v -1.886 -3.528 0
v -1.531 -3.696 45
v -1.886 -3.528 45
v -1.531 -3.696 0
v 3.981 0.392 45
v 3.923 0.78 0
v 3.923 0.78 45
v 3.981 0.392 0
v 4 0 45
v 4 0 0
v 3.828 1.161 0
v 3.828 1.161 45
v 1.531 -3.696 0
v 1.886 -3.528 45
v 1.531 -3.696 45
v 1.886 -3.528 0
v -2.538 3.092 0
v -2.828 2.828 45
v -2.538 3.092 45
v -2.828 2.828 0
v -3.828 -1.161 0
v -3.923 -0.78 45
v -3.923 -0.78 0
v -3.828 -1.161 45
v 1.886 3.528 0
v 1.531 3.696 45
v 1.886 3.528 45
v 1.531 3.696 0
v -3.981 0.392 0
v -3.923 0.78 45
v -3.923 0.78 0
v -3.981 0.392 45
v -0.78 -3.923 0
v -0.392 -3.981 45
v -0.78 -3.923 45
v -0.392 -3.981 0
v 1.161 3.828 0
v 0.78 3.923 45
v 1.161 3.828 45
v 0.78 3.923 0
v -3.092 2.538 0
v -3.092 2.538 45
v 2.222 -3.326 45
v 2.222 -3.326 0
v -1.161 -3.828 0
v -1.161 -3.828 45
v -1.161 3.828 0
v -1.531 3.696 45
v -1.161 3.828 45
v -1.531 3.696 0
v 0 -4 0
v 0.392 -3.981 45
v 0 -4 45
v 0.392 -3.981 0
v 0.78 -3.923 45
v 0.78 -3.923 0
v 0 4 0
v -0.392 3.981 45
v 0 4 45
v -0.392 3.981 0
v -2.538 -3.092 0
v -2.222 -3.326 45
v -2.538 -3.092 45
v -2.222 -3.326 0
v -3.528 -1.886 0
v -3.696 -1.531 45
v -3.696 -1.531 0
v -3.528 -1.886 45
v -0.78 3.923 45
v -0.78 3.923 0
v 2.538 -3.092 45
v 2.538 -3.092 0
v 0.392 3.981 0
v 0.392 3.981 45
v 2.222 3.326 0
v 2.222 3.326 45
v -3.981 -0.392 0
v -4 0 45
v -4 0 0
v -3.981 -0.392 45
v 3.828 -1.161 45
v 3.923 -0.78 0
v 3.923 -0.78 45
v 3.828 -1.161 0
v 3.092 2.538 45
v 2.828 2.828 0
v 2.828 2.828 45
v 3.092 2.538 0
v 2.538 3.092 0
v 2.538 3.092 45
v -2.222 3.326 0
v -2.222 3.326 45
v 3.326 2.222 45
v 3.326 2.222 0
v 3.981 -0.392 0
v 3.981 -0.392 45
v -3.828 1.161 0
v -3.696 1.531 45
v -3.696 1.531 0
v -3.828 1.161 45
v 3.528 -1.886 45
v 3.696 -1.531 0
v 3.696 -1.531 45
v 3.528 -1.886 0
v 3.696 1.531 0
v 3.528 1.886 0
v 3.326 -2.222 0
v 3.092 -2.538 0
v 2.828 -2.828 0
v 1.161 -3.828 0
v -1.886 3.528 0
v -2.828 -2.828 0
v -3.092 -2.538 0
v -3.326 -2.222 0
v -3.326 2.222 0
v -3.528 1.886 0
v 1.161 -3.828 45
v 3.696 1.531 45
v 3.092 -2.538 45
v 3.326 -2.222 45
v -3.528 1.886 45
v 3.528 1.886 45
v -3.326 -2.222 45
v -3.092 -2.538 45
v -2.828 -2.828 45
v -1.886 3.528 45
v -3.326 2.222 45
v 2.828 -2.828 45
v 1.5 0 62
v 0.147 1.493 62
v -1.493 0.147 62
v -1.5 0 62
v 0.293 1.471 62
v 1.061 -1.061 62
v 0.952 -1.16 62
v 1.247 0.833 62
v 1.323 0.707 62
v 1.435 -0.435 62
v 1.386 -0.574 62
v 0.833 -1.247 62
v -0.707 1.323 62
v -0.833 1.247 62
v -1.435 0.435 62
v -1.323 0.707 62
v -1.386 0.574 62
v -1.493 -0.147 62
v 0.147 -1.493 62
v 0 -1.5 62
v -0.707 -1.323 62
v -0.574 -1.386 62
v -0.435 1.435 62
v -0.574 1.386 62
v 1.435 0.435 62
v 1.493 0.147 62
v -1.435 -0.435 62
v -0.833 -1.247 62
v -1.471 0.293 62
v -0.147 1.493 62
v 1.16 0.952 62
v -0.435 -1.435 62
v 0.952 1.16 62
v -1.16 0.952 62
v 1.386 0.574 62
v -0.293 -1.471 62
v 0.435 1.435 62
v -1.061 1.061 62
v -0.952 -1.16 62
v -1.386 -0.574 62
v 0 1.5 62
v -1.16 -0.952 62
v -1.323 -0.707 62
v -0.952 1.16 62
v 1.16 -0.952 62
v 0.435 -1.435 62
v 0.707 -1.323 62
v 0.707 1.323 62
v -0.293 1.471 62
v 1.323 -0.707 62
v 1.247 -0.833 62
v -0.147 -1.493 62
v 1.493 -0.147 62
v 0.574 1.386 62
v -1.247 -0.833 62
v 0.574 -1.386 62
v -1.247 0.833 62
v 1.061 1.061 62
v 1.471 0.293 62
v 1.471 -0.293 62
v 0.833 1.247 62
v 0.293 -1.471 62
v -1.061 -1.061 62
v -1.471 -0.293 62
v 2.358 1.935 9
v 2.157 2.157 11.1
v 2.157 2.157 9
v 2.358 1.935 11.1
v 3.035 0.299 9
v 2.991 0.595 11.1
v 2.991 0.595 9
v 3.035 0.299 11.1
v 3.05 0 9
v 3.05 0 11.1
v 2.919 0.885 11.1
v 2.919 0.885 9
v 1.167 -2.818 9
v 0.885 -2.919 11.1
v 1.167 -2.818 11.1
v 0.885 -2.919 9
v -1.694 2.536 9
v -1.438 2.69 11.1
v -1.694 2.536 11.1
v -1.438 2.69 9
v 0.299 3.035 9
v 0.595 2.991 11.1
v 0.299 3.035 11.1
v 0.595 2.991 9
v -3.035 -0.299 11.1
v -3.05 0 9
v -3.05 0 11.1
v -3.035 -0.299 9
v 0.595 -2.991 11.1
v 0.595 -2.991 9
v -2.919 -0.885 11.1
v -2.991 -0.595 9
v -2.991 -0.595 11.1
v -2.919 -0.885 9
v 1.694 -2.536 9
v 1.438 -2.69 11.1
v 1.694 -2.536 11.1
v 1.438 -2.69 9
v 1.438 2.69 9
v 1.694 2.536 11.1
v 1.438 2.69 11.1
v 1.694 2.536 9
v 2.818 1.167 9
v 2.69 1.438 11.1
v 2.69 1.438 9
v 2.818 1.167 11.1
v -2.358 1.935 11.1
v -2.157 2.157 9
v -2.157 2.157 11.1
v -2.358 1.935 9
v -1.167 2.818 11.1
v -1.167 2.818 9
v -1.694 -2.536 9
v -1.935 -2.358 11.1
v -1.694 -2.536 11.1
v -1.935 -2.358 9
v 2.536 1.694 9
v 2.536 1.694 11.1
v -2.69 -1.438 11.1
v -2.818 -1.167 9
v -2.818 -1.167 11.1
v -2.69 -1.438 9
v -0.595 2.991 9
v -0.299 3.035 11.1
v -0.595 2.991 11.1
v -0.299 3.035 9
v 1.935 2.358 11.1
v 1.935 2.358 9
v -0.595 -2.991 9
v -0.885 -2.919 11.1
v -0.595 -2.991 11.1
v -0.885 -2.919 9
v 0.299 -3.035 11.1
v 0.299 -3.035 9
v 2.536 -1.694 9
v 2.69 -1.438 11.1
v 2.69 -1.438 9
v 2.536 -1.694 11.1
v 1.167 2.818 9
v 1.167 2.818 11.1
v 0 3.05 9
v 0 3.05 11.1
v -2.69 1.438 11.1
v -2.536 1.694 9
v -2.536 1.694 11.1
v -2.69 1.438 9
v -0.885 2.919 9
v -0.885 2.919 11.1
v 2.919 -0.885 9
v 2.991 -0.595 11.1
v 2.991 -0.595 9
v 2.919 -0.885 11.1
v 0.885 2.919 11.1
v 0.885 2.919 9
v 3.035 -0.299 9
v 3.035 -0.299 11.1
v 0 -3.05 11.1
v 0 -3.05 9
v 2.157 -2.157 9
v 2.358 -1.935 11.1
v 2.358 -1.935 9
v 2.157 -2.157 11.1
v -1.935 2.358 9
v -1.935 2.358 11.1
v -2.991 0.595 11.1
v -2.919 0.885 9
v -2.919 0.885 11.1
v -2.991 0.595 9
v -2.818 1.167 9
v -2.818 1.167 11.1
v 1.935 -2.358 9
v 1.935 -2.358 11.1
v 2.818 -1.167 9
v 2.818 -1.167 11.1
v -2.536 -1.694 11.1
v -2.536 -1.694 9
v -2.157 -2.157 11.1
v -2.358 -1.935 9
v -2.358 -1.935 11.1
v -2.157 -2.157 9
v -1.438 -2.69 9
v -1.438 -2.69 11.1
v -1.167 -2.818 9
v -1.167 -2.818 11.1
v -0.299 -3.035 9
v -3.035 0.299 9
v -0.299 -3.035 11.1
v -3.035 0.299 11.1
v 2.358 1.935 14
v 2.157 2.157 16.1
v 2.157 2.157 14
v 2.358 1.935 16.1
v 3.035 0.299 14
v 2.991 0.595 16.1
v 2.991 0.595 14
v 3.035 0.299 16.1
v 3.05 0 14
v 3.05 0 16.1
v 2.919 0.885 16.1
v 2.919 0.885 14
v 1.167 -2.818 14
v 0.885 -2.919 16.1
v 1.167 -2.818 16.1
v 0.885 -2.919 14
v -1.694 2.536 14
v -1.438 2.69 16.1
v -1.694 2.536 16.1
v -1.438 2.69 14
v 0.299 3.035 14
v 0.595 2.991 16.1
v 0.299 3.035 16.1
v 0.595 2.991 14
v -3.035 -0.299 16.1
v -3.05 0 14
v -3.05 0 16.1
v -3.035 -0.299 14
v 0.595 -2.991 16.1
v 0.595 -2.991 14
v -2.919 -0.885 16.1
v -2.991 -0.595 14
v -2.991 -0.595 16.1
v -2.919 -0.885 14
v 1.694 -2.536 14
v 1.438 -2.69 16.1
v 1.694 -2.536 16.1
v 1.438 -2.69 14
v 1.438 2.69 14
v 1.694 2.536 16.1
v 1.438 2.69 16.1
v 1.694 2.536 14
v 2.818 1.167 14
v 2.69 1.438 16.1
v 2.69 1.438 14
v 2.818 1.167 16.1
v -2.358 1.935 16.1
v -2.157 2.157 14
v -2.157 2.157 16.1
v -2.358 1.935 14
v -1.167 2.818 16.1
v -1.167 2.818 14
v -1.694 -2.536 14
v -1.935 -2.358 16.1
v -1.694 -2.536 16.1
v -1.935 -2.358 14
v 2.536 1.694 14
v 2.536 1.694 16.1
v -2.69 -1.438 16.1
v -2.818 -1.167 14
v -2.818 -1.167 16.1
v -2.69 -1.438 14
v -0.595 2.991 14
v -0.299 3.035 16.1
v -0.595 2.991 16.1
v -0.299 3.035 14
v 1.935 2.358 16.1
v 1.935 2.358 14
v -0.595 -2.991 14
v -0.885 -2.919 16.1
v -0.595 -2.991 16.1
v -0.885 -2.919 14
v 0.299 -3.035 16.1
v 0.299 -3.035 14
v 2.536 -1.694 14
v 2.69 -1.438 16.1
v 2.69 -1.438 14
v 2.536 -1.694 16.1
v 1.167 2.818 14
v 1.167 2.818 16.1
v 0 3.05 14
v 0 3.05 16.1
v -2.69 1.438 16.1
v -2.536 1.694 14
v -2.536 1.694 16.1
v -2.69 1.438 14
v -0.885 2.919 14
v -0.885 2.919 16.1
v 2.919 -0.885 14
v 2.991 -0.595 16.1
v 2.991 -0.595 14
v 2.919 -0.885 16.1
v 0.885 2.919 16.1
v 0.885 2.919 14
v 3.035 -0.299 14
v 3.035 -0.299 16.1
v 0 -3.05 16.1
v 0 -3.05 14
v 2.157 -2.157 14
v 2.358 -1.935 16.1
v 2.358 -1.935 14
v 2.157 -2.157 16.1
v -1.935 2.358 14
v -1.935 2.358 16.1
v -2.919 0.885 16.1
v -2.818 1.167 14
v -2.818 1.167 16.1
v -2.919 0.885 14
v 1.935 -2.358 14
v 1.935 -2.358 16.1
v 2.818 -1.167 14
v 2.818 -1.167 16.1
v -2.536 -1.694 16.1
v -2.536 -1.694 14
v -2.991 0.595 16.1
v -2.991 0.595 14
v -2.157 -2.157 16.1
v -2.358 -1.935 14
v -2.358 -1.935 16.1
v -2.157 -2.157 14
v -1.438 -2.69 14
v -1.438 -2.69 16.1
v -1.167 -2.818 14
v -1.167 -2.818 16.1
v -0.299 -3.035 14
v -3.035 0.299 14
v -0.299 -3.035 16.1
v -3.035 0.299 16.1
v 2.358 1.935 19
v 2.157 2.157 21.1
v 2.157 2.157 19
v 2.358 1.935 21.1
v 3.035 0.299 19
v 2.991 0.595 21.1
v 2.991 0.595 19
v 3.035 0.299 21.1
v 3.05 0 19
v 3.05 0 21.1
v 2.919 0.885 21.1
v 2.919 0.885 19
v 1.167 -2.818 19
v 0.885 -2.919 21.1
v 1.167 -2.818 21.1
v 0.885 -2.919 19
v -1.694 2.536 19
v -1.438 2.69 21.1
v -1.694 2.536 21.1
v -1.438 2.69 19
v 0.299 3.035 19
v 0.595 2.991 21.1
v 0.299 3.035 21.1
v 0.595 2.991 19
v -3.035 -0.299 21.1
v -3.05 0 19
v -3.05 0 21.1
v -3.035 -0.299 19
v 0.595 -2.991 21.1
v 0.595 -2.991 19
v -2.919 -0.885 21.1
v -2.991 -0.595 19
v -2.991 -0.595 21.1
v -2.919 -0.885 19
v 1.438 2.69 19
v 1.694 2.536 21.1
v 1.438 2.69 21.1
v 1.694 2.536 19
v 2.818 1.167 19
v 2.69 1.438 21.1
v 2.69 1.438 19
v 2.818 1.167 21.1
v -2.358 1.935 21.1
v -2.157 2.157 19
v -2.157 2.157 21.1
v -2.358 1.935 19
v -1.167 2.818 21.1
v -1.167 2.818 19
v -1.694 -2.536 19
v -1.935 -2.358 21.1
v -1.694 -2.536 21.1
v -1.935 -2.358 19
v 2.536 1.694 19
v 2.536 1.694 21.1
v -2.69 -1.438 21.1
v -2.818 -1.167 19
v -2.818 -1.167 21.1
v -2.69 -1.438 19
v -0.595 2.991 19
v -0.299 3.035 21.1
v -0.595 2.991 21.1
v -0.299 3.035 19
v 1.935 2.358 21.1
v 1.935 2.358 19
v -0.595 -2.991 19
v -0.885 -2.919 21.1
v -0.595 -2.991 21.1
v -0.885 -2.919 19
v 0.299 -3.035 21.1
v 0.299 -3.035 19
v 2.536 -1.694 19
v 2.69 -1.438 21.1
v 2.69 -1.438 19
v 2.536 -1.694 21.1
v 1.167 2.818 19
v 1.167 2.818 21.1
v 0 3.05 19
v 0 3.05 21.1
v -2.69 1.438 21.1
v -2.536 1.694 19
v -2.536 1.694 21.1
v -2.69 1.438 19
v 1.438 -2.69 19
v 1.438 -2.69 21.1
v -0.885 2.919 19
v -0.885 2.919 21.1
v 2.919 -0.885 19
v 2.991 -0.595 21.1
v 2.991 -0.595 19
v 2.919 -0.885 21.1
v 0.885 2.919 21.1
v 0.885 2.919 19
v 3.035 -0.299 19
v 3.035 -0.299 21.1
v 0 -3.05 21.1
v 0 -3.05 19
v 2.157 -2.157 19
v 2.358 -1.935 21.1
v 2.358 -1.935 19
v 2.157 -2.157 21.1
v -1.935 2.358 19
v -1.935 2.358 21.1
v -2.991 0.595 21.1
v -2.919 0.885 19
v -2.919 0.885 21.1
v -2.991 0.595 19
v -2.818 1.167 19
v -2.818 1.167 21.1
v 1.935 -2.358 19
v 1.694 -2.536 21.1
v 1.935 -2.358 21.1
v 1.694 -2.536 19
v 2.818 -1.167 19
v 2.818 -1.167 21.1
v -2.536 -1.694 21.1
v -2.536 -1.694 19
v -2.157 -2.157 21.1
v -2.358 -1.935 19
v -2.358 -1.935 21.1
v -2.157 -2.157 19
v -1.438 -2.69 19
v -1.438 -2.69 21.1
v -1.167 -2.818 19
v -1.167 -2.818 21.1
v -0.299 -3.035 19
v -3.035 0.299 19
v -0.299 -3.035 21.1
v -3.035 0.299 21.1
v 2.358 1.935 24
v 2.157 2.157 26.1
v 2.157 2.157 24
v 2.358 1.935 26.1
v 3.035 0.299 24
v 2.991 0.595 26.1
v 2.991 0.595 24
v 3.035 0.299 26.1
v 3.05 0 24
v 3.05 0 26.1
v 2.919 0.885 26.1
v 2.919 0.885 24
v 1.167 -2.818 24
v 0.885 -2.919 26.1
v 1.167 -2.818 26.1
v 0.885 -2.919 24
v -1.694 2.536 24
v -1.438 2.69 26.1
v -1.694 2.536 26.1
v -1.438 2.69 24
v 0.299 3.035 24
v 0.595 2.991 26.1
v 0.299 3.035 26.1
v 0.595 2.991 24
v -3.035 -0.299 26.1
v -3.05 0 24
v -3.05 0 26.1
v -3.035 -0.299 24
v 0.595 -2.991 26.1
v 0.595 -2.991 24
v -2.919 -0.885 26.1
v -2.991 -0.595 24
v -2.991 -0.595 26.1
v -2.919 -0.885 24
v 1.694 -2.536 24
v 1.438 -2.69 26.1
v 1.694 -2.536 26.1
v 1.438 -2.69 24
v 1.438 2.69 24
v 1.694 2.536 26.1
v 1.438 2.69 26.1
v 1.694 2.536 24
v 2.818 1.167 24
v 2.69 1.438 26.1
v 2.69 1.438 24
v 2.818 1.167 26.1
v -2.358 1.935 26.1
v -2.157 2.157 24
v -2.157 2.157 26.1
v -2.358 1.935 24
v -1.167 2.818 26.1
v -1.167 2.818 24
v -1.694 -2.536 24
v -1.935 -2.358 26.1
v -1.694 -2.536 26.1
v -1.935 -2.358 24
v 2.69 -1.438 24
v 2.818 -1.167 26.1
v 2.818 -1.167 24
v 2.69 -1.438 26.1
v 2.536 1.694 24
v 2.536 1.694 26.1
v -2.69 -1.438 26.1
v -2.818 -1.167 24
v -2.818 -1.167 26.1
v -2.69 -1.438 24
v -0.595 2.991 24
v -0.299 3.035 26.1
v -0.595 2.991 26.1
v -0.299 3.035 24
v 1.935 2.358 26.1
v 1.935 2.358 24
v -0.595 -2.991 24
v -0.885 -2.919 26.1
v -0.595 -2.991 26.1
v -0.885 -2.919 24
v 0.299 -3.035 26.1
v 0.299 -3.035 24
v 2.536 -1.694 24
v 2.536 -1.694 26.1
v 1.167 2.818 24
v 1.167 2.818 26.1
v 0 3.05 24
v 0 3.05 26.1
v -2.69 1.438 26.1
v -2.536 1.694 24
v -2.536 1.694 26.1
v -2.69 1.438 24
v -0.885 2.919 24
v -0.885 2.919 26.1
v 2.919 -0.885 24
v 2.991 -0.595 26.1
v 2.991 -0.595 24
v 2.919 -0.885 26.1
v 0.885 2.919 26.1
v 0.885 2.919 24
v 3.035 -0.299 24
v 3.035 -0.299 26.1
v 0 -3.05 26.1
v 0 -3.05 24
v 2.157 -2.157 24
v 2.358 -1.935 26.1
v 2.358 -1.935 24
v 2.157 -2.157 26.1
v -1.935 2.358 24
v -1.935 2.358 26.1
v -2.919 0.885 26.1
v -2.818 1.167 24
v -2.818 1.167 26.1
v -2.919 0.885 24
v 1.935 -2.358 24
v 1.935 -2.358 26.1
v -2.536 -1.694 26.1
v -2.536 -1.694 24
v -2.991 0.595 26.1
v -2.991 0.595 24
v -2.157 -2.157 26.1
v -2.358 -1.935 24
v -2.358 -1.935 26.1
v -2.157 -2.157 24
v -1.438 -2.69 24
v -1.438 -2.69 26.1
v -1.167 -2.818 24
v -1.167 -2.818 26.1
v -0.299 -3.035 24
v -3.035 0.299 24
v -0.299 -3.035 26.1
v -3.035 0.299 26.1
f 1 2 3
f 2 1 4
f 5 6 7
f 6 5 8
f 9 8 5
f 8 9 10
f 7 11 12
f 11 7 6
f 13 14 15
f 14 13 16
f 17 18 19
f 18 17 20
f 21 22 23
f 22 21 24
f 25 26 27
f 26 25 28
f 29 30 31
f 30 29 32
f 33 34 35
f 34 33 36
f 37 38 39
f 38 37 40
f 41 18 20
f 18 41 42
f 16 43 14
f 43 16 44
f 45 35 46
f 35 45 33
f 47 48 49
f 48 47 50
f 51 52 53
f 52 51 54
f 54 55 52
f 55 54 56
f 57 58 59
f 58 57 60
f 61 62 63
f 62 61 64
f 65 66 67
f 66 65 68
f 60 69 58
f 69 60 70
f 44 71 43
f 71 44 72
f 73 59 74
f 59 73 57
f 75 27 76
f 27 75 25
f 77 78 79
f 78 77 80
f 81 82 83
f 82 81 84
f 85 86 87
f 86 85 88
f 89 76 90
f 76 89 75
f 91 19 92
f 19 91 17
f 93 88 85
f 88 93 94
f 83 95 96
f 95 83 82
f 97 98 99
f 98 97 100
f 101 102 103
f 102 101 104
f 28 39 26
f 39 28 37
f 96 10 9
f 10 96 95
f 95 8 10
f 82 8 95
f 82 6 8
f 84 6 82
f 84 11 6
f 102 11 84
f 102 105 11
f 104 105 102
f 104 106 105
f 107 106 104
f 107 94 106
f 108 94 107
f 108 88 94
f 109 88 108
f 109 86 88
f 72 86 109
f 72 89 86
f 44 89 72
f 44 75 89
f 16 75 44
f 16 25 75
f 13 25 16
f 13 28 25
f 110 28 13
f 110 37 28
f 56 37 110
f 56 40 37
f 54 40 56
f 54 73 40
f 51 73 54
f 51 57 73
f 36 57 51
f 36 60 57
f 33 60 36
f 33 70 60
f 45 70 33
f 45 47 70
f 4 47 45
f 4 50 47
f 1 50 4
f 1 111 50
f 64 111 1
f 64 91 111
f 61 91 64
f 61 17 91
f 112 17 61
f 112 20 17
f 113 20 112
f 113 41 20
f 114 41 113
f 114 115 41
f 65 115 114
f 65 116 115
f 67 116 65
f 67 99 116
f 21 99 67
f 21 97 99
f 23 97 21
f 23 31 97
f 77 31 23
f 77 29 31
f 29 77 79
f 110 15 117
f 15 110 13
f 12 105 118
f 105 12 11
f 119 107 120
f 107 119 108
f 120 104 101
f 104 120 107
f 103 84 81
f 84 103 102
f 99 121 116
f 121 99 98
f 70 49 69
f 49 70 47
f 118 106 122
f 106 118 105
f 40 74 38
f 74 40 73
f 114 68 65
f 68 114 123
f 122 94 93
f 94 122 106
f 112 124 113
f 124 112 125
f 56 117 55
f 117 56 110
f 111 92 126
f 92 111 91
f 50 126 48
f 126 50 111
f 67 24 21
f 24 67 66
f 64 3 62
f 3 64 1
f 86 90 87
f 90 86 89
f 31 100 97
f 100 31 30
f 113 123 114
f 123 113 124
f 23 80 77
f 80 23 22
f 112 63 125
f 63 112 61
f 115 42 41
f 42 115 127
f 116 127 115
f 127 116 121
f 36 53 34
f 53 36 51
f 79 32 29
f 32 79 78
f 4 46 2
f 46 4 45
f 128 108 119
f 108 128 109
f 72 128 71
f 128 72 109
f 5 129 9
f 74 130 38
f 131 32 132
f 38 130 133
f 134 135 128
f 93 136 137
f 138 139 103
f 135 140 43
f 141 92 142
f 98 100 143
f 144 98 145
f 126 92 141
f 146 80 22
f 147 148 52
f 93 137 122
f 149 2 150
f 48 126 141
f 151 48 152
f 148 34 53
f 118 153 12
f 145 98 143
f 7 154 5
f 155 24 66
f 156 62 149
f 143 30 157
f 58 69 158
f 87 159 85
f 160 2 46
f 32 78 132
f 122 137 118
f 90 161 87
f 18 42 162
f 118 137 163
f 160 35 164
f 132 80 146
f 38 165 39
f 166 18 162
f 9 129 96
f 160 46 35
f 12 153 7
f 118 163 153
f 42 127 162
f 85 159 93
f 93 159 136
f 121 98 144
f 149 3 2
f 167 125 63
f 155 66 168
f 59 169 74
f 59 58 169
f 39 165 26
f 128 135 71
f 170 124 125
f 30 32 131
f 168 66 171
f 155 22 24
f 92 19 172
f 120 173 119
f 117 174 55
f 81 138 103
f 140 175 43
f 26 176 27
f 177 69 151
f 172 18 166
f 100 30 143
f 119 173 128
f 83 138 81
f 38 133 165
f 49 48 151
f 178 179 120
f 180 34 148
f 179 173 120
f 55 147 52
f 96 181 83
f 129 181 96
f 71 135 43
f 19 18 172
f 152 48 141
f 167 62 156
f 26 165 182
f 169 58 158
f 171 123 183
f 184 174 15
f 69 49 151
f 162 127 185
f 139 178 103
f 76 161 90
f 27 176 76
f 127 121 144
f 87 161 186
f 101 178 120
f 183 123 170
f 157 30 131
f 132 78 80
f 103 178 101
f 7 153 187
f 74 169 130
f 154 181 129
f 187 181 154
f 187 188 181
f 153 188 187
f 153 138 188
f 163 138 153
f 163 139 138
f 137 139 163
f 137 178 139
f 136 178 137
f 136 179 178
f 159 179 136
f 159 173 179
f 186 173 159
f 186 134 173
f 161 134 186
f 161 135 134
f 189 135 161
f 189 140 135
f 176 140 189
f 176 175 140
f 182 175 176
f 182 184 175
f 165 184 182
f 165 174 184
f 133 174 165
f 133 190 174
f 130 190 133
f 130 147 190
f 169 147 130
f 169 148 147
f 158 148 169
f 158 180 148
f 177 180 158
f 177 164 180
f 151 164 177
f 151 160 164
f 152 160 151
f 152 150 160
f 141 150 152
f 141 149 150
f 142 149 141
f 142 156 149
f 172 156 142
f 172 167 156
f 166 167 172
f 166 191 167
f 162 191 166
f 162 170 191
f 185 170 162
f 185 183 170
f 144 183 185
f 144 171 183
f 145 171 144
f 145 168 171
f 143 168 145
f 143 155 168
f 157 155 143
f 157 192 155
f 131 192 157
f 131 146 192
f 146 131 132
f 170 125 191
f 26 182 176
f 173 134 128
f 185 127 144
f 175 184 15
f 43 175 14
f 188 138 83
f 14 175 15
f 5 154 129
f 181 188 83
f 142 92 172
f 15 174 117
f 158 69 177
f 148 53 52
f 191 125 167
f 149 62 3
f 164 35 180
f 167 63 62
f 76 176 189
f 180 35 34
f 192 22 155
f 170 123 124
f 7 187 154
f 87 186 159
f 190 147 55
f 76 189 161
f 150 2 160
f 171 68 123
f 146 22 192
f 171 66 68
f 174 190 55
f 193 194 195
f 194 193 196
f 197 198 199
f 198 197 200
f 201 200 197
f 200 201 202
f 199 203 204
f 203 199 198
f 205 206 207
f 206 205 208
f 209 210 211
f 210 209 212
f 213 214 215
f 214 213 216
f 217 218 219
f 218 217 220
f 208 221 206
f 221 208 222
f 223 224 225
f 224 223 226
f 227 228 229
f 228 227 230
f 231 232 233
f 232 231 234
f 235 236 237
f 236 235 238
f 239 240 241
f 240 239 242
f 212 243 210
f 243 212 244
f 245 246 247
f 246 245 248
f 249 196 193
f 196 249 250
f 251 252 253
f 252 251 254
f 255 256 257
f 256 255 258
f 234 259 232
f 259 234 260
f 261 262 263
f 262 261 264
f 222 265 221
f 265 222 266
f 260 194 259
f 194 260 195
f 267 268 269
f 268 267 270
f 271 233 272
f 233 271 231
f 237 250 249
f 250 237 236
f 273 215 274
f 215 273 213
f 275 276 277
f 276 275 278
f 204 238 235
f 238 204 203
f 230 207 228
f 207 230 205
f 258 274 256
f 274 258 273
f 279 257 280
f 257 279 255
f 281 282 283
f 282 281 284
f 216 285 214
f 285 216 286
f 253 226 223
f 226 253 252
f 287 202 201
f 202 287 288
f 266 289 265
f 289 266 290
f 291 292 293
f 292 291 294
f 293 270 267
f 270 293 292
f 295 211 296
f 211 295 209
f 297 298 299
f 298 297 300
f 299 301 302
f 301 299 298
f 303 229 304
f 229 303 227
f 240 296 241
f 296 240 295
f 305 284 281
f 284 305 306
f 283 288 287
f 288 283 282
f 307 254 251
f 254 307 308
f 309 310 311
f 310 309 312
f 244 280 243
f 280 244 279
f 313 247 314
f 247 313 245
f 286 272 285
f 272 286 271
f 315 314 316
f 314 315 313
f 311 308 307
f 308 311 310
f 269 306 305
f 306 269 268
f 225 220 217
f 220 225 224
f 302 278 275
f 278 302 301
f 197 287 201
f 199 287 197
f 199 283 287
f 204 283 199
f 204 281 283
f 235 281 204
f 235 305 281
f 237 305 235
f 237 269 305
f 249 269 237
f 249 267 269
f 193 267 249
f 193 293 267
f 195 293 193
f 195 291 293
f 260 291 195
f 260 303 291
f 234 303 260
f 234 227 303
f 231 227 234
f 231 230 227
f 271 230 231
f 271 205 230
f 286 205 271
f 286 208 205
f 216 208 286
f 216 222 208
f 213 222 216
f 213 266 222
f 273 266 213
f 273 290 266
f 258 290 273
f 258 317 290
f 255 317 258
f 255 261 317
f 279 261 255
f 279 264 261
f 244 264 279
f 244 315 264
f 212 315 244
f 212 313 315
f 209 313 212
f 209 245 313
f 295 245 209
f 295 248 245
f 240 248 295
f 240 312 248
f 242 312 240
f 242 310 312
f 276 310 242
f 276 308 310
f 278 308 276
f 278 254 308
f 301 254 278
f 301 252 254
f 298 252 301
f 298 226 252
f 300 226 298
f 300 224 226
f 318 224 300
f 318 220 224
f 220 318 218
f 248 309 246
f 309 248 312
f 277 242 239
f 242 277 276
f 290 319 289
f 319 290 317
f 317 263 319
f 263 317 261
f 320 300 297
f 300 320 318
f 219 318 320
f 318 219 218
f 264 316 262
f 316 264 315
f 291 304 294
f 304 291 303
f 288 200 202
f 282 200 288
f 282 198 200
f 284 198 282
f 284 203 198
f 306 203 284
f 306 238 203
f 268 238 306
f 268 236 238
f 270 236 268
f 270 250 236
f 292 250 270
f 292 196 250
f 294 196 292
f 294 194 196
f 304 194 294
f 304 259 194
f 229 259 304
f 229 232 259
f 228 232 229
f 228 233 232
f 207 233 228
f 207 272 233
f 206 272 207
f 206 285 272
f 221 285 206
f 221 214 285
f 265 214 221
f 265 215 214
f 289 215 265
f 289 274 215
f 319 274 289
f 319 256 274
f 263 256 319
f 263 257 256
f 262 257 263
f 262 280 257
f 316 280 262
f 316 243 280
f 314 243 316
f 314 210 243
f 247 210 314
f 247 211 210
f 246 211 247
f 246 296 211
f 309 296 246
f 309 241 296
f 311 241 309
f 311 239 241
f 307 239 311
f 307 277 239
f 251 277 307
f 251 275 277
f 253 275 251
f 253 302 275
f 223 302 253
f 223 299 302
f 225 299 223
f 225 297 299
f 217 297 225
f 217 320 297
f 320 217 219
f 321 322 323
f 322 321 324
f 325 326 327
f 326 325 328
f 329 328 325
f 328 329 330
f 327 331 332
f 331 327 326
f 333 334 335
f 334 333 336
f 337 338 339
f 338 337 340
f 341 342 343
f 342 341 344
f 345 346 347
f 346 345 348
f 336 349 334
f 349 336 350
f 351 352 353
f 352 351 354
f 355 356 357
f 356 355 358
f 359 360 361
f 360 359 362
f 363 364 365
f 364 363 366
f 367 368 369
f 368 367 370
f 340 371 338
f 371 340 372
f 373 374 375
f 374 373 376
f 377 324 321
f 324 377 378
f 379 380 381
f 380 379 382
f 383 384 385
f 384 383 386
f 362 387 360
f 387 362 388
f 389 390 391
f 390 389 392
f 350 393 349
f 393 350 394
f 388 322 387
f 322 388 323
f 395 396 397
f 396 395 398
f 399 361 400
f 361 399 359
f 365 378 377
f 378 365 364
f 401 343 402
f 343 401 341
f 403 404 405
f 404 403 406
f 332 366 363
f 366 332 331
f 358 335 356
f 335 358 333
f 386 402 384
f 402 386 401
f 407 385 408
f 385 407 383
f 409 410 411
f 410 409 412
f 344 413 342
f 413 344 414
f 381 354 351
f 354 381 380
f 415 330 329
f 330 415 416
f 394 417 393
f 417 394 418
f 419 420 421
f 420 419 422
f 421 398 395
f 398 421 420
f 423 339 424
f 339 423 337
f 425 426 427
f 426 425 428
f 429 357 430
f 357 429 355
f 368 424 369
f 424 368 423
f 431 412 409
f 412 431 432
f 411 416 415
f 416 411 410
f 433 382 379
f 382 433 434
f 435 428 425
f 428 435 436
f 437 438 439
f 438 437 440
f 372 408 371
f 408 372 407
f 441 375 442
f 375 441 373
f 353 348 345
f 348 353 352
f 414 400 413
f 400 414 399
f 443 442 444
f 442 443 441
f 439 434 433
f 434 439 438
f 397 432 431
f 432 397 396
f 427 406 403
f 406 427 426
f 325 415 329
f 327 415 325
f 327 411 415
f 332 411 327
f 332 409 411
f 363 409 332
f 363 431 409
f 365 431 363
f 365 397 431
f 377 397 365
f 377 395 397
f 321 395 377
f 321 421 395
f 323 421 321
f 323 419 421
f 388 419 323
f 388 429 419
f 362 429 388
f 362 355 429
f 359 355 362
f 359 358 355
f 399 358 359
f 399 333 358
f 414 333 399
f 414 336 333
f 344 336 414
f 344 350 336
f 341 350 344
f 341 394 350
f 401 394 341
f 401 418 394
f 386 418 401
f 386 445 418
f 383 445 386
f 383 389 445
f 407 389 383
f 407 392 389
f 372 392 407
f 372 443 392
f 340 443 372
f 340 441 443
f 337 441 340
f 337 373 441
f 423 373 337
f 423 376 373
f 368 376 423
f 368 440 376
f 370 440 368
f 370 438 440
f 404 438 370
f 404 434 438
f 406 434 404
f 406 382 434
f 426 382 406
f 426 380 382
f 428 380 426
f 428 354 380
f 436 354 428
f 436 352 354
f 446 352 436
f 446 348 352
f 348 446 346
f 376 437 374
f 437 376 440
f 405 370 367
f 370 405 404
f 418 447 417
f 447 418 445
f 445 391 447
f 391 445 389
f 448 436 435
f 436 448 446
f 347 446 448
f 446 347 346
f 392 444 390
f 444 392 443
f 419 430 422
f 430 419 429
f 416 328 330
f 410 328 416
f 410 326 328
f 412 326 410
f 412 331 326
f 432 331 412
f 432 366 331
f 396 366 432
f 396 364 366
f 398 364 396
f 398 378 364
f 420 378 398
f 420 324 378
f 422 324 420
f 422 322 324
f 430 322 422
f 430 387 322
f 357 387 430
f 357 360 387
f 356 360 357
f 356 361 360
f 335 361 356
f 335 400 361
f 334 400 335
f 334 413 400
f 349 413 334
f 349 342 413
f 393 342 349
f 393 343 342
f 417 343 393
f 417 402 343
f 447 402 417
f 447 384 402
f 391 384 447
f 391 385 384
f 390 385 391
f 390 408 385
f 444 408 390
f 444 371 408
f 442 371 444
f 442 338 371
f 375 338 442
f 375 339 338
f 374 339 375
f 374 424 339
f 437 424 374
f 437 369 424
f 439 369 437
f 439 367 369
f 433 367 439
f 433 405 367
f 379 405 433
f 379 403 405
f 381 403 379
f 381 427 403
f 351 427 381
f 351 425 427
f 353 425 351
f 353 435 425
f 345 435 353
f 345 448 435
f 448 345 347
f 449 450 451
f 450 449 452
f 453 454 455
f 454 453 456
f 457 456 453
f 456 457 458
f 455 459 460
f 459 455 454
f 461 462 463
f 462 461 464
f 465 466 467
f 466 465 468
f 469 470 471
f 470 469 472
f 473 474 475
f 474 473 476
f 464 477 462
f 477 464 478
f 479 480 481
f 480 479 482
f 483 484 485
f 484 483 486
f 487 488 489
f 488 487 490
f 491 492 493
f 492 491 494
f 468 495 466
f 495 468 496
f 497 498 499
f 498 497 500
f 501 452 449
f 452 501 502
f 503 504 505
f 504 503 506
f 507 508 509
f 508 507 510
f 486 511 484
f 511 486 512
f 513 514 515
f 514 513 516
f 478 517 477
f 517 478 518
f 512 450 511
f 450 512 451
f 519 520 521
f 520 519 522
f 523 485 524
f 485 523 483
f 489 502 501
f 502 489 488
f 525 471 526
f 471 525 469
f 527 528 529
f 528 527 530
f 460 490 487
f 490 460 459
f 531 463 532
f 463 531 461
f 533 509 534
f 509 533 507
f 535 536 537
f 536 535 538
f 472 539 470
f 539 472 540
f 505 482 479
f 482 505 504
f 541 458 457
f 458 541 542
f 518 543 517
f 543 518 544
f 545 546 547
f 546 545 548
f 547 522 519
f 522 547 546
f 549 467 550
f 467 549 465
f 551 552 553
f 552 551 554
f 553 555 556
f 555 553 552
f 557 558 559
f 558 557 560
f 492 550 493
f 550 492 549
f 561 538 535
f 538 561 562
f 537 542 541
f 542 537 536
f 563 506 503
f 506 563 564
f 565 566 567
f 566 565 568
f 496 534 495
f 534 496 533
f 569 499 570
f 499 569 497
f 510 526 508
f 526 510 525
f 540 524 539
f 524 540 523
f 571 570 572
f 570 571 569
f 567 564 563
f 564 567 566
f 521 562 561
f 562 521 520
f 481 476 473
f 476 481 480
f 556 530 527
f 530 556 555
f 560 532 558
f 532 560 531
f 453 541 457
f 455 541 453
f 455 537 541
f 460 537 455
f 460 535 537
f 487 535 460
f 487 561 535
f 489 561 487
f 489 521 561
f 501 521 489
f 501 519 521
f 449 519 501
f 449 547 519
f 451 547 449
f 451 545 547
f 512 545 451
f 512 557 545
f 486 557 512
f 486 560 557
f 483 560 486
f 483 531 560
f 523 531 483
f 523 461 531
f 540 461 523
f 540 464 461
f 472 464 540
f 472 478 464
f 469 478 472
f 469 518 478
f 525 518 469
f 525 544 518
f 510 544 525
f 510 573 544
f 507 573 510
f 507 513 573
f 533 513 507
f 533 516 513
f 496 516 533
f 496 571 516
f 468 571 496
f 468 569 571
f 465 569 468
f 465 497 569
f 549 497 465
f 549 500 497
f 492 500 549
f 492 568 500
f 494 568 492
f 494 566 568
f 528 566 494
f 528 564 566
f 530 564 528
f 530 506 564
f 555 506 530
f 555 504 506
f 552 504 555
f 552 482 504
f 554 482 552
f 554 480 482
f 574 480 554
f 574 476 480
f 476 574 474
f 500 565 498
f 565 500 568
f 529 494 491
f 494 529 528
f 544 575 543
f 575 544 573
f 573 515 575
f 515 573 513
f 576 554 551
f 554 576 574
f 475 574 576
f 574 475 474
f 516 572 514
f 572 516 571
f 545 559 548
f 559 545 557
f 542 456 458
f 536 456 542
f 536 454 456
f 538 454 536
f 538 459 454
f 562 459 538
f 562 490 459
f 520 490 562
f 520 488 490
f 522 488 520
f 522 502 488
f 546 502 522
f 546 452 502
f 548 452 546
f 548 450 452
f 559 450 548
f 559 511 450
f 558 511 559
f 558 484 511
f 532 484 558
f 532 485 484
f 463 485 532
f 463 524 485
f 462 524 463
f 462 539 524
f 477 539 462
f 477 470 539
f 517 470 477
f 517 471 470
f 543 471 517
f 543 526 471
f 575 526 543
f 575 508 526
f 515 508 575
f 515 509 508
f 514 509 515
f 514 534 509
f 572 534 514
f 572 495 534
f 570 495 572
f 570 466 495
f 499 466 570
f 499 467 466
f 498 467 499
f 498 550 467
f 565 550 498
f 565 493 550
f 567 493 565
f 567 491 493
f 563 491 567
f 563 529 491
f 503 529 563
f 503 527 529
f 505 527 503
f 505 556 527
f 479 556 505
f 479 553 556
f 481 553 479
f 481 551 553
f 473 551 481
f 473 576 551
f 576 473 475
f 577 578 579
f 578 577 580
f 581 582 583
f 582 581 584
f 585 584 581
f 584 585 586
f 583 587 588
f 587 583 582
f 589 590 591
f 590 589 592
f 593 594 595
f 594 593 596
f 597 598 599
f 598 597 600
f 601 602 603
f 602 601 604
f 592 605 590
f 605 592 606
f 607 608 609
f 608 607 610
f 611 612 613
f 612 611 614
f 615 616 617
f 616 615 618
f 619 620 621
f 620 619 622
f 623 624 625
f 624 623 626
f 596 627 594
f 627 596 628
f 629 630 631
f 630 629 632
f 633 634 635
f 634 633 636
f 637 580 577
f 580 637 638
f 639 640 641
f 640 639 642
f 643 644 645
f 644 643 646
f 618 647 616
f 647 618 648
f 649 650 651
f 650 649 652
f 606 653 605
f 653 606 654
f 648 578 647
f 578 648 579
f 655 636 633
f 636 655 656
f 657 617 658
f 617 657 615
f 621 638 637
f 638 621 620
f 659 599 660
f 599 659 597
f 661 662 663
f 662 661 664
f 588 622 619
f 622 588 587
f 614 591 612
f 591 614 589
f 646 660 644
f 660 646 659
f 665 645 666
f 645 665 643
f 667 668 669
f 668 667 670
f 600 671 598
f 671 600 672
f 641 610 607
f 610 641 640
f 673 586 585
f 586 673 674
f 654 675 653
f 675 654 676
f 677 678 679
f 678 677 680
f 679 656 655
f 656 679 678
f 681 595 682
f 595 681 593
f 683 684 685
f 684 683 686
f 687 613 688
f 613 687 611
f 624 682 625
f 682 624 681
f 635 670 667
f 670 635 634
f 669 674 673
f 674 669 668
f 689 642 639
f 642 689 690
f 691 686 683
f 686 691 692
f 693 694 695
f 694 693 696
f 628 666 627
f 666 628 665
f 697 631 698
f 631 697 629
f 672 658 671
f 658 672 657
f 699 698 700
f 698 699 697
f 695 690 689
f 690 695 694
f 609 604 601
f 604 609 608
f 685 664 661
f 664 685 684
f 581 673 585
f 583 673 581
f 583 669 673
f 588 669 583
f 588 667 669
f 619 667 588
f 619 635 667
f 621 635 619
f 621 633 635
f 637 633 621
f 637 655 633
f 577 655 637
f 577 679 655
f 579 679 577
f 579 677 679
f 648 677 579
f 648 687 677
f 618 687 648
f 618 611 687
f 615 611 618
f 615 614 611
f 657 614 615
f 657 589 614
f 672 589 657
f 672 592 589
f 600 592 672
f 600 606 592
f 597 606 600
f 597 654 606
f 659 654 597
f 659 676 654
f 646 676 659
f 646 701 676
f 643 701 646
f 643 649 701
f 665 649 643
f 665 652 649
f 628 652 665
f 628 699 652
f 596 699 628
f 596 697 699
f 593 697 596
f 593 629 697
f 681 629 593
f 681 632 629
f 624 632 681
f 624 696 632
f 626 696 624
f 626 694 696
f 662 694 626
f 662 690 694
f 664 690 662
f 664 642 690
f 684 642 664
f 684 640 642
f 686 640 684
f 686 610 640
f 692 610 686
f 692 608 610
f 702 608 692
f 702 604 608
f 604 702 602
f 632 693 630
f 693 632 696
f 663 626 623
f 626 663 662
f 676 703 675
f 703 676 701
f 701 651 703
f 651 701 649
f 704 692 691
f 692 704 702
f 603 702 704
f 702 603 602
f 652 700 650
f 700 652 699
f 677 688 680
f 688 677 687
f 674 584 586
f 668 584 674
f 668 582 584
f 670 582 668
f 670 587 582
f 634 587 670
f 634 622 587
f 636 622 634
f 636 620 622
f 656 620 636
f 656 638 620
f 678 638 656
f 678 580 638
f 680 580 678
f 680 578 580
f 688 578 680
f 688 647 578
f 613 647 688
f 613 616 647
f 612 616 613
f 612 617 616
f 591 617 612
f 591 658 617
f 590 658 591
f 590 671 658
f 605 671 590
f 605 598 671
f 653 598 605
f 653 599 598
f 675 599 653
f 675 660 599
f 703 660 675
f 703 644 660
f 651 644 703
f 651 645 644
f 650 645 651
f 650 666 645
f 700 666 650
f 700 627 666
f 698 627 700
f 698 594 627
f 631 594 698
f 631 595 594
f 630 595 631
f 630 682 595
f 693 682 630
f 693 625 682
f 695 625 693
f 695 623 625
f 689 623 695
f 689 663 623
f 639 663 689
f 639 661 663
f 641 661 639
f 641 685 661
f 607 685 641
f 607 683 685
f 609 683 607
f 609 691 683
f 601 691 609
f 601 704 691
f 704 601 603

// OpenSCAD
// Pestle for 1.5 mL microcentrifuge tube - standing upright on XY plane.
// Dimensions in mm.

// Handle
handle_d = 8;
handle_z_start = 0;
handle_z_end = 45;

// Cone
cone_z_start = 45;
cone_z_end = 62;
cone_d_top = 8;
cone_d_bot = 3;

// Tip
tip_d = 3;
tip_z_center = 62;

// Grooves
num_grooves = 4;
groove_w = 2;   // width in Z
groove_depth = 1; // depth (radial)
groove_zs = [10, 15, 20, 25]; // centers of grooves

$fn = 64;

// Main body: Handle + Cone + Tip
difference() {
    union() {
        // 1. Cylindrical Handle
        translate([0, 0, handle_z_start])
            cylinder(h = handle_z_end - handle_z_start, d = handle_d);

        // 2. Cone (tapering from top of handle to tip base)
        translate([0, 0, cone_z_start])
            cylinder(h = cone_z_end - cone_z_start, d1 = cone_d_top, d2 = cone_d_bot);

        // 3. Rounded Tip (Sphere centered at tip_z_center)
        translate([0, 0, tip_z_center - tip_d / 2])
            sphere(d = tip_d);
    }

    // 4. Grooves (cut into the handle)
    // To create a groove of 'groove_depth' on a cylinder of diameter 'handle_d',
    // we cut a cylinder with diameter = handle_d - 2 * groove_depth.
    // The cutter must extend slightly past the handle in Z to ensure clean cuts.
    cutter_d = handle_d - 2 * groove_depth + 0.1;
    cutter_h = groove_w + 0.1;

    for (z = groove_zs) {
        translate([0, 0, z - groove_w / 2])
            cylinder(h = cutter_h, d = cutter_d);
    }
}
